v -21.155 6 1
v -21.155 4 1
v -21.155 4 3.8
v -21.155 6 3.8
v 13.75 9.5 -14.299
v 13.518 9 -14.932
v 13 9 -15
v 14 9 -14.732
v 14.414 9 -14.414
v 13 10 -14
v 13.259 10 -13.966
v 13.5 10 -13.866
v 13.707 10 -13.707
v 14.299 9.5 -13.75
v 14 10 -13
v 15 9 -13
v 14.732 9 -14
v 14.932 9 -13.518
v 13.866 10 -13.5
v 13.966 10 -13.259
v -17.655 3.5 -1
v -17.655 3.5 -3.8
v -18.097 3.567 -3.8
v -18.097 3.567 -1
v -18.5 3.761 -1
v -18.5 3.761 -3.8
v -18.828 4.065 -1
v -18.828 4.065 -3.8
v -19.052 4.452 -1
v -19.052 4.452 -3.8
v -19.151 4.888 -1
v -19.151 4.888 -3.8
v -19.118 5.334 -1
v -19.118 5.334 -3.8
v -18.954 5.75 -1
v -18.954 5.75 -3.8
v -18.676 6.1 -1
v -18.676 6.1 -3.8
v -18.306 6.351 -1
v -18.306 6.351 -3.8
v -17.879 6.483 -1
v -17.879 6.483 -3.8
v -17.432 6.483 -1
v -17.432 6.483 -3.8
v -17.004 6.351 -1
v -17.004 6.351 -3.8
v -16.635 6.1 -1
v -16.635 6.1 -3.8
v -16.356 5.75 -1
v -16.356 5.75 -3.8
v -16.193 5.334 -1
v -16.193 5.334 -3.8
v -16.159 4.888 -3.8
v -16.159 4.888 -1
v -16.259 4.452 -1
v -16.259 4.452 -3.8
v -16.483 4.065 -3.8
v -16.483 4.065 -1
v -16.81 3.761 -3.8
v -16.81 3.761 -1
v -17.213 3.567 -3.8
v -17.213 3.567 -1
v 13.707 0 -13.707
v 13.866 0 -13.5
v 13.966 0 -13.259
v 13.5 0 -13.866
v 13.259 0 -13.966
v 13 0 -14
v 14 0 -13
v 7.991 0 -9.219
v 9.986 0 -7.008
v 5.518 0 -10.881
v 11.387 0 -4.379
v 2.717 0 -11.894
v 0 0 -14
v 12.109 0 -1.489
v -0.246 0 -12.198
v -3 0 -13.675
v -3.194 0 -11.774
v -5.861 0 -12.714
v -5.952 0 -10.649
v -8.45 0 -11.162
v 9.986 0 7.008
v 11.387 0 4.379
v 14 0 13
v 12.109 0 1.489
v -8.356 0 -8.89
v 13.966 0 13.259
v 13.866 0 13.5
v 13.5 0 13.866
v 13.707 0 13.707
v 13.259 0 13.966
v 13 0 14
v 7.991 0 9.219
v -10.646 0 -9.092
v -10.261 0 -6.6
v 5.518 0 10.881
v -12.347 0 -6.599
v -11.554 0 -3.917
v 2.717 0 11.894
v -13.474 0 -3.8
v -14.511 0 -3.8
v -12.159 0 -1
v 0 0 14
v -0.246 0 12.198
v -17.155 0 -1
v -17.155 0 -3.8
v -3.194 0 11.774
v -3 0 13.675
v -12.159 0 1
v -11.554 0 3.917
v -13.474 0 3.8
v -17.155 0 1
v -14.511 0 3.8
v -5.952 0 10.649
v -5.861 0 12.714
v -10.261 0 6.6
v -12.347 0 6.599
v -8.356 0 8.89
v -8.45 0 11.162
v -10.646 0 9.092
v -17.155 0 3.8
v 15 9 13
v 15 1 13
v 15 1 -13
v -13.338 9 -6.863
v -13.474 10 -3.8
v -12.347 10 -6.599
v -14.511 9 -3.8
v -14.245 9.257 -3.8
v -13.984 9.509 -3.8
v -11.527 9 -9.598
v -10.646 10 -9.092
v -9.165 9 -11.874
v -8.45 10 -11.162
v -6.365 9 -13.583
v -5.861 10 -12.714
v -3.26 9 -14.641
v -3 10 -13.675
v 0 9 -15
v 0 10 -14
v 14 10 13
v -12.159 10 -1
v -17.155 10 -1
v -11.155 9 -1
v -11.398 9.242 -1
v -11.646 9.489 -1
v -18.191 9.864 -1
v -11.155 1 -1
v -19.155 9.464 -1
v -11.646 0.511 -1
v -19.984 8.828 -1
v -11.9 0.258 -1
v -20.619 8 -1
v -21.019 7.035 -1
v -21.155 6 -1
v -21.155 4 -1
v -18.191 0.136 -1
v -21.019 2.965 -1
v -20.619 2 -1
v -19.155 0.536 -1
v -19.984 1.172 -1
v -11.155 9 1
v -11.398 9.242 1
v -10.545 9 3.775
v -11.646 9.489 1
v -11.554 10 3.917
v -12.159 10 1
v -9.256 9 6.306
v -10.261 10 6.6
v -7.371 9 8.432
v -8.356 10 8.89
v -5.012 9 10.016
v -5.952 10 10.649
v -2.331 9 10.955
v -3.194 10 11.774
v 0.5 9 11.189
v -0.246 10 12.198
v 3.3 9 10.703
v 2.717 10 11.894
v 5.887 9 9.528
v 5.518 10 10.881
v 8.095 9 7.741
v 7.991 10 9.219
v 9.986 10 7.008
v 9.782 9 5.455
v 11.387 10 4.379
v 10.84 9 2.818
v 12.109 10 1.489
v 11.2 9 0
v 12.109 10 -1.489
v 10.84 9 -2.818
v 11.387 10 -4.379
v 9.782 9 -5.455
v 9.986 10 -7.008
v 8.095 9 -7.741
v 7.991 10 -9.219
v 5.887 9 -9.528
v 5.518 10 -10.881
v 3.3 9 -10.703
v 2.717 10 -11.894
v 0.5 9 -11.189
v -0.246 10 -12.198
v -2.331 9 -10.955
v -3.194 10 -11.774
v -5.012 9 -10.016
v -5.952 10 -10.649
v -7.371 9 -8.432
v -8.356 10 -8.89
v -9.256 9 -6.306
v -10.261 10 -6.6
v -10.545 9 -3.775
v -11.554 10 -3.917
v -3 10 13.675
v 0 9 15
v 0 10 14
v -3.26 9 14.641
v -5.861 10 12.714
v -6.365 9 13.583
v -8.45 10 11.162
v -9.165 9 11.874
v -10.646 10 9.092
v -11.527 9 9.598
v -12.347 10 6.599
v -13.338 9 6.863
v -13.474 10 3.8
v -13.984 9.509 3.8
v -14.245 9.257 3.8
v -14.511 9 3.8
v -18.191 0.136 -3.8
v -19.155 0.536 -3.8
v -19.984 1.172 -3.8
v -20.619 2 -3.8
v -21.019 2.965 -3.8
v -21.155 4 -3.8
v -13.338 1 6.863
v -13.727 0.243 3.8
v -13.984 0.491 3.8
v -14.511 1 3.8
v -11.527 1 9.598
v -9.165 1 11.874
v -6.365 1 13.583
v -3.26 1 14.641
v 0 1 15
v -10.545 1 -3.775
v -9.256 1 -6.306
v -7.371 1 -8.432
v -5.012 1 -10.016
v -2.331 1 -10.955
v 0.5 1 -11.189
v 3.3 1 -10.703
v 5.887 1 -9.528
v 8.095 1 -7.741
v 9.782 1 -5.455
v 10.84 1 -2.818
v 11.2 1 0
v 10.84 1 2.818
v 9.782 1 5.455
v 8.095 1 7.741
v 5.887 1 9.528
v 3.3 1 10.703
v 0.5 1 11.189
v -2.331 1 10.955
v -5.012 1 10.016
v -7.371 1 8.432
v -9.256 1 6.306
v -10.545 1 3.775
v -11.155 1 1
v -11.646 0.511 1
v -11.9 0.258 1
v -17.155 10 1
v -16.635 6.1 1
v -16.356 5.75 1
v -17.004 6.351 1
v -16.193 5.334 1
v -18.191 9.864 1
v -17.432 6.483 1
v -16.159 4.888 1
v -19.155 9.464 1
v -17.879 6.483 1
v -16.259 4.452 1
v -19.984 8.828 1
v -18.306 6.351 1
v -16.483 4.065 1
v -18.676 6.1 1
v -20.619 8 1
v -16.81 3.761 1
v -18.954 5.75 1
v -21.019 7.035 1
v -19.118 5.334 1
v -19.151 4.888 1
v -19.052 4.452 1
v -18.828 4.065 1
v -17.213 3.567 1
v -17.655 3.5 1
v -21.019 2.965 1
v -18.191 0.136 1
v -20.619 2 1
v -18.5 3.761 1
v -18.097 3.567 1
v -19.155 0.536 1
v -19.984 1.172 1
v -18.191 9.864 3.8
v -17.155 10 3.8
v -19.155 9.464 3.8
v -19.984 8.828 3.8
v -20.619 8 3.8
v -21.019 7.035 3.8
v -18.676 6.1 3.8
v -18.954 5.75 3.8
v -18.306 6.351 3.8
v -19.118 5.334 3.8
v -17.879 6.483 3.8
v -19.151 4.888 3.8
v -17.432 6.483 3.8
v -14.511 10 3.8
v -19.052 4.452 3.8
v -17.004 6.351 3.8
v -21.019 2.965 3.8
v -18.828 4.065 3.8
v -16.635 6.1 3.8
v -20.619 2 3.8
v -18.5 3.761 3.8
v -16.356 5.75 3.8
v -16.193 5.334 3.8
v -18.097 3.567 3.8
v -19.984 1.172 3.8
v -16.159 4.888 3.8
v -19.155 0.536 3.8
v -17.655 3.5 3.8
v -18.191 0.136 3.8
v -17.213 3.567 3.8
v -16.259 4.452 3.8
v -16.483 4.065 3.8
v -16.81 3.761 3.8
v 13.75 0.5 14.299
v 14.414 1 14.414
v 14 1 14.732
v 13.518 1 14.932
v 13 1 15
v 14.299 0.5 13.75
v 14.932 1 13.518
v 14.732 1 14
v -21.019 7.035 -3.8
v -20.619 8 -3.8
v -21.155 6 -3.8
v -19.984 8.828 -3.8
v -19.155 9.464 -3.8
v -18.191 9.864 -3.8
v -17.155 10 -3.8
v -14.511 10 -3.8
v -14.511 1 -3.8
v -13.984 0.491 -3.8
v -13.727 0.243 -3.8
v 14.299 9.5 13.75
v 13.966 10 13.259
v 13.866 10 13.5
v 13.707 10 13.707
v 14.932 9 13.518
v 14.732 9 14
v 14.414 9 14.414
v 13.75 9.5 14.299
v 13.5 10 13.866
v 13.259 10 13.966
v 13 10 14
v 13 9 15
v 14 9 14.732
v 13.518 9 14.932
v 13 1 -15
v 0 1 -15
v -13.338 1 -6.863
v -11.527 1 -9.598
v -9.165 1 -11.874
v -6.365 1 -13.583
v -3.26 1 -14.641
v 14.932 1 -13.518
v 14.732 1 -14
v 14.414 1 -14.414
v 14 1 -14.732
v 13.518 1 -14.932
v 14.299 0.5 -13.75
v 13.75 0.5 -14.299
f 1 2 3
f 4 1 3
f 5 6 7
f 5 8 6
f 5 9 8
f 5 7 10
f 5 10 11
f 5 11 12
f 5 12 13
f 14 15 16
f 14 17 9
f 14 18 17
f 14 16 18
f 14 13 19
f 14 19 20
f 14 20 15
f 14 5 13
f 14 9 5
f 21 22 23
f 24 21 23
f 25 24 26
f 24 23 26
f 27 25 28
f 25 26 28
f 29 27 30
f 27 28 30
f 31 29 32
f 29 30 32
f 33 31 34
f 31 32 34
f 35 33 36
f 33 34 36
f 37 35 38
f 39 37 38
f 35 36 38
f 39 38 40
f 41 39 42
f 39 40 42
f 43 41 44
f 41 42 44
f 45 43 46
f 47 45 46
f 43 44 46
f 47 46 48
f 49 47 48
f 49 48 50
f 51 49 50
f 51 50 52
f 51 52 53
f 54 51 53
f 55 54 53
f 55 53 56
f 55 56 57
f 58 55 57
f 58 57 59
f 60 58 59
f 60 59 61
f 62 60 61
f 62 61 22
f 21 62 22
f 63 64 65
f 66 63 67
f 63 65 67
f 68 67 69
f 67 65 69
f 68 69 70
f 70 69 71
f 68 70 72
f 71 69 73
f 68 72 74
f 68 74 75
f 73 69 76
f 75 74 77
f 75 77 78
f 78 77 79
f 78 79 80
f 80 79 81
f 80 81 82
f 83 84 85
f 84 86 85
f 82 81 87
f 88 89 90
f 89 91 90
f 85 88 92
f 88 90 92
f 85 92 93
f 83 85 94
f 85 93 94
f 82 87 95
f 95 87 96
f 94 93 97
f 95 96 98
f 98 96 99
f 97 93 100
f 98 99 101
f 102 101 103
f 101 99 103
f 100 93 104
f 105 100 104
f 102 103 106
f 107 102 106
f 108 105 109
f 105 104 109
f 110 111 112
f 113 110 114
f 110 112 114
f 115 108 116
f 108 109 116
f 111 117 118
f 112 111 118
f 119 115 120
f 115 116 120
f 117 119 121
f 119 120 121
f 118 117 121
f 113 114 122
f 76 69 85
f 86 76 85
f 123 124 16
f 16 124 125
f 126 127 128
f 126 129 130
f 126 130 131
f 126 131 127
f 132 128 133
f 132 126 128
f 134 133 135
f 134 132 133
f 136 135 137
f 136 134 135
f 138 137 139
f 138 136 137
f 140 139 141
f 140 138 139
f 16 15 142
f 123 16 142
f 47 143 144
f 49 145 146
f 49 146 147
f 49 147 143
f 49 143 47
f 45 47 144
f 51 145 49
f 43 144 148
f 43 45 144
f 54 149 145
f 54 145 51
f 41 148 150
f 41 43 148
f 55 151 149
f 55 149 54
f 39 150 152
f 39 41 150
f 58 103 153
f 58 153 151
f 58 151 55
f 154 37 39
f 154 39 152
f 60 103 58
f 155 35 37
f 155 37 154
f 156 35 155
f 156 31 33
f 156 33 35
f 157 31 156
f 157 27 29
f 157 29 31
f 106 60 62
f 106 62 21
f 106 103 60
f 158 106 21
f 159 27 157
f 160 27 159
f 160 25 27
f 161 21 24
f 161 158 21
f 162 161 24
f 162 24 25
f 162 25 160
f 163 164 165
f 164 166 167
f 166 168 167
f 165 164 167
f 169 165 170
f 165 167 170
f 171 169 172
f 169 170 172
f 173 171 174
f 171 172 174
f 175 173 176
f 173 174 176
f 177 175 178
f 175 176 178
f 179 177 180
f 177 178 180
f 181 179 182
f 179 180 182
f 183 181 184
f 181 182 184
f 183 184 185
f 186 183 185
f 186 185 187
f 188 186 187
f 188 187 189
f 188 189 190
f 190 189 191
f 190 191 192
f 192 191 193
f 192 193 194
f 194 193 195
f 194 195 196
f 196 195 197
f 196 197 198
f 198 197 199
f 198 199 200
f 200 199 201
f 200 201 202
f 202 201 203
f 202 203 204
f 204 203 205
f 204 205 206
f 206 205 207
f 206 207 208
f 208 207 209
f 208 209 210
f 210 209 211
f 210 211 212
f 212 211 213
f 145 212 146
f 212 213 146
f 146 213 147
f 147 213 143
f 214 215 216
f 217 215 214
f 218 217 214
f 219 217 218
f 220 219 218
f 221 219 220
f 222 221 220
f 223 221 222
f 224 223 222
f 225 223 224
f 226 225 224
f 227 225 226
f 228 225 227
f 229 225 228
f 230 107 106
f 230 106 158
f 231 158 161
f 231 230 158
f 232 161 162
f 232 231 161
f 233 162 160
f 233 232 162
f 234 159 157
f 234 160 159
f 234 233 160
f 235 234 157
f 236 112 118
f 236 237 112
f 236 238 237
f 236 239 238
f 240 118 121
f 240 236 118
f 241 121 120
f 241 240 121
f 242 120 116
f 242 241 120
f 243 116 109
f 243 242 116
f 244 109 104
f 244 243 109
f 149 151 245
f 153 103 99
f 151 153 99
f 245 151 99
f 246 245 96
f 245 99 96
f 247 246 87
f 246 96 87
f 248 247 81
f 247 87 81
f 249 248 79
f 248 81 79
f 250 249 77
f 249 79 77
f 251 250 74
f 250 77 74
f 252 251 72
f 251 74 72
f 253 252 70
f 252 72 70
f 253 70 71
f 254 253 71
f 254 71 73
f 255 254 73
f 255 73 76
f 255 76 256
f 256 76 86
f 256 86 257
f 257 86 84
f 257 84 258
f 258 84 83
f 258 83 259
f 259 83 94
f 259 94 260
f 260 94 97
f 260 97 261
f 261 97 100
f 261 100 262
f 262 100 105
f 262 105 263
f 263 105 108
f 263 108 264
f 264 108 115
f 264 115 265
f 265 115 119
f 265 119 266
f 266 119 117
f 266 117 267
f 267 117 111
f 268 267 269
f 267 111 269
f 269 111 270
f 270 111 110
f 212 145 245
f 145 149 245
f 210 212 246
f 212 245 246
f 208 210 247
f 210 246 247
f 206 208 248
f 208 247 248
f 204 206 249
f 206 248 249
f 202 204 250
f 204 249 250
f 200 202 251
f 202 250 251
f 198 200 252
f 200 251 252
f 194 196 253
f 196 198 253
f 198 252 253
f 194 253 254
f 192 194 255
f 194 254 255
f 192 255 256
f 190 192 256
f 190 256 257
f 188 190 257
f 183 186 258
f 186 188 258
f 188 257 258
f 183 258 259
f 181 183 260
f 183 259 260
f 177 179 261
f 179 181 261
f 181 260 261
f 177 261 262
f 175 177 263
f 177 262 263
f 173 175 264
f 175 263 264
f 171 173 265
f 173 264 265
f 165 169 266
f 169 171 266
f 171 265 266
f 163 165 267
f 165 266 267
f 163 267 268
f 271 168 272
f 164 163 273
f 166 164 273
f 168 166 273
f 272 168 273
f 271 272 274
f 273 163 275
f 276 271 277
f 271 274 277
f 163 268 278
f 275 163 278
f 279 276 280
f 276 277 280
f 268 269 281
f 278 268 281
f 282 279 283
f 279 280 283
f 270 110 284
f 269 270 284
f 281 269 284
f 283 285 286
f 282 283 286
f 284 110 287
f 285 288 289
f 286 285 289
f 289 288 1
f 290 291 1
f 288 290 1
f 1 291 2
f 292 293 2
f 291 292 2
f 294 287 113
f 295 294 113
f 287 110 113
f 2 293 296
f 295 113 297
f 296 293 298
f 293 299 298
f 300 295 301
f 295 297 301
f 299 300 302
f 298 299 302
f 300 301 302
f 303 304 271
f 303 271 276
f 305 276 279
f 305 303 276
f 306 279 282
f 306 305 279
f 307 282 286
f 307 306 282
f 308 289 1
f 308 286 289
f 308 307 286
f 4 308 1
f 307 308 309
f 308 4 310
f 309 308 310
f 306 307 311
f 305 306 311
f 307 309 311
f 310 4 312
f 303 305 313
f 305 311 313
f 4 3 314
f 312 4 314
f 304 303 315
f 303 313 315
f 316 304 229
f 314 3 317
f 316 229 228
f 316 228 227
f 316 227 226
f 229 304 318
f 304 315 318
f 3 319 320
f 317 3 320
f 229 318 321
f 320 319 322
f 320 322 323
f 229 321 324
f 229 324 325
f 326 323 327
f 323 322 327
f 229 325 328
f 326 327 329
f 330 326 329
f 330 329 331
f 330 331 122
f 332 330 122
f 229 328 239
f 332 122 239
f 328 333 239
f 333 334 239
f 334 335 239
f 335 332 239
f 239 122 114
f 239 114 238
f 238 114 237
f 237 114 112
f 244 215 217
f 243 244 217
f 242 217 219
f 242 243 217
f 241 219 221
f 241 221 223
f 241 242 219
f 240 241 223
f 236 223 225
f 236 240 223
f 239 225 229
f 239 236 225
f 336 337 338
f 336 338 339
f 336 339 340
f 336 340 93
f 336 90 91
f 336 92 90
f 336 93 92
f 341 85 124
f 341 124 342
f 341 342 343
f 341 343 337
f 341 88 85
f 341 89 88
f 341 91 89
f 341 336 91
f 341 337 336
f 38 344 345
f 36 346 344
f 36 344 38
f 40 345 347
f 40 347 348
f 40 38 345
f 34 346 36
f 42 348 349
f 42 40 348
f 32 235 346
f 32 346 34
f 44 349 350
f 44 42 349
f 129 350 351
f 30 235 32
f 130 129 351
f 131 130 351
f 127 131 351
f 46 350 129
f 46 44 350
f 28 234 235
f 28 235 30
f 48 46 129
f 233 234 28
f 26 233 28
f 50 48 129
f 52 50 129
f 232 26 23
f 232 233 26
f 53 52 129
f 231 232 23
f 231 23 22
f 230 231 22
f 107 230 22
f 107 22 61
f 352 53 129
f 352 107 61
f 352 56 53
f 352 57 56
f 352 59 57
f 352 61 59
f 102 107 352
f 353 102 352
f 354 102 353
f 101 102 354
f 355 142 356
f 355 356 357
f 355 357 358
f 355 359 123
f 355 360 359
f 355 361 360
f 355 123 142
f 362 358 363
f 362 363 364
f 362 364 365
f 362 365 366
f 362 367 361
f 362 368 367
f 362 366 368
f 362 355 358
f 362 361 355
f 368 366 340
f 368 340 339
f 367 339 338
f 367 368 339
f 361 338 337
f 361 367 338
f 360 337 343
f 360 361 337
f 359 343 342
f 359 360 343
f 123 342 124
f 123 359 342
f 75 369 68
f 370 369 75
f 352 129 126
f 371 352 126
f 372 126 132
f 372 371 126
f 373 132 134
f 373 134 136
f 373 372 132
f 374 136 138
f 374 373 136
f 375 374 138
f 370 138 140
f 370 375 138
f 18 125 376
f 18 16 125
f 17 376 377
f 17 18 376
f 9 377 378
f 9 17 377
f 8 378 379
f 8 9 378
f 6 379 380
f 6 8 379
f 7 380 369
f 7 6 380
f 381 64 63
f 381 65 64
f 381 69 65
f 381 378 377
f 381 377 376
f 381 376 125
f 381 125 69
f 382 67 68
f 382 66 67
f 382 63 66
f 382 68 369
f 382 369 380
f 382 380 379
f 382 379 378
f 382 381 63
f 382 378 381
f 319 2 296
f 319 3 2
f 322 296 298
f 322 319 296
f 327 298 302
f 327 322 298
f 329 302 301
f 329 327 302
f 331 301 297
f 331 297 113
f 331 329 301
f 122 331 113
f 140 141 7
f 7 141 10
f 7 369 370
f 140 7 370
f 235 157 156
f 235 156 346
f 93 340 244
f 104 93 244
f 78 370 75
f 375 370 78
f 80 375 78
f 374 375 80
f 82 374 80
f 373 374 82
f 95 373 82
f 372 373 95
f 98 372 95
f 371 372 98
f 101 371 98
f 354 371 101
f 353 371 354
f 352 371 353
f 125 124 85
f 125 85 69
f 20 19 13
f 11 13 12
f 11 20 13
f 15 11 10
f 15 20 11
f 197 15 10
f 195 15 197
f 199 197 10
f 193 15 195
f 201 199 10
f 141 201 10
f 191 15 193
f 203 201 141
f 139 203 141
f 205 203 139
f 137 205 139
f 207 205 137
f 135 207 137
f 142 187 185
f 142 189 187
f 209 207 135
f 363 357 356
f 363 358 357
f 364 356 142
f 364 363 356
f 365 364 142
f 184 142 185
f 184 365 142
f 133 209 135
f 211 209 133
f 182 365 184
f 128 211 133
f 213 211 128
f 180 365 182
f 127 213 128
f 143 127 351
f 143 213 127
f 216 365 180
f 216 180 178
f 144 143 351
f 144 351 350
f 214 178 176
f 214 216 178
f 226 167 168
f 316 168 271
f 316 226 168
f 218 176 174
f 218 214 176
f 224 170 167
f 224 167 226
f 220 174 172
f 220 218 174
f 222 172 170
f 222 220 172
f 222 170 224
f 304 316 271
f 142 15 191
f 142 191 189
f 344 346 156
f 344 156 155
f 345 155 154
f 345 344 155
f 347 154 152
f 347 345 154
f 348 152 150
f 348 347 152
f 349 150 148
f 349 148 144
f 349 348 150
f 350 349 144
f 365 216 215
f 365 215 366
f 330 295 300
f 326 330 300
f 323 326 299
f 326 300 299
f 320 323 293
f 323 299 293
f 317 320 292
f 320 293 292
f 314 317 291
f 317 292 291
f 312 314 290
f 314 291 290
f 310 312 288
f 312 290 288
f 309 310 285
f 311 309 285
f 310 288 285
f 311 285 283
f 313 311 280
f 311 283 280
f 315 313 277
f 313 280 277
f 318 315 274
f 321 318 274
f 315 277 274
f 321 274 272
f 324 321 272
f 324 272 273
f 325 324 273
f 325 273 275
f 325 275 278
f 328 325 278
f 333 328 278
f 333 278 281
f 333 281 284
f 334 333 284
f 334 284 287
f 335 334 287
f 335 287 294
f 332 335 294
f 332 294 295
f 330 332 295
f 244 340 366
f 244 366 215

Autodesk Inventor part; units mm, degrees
ref_plane "YZ Plane" through (0, 0, 0) normal (1, 0, 0) x (0, 1, 0)
ref_plane "XZ Plane" through (0, 0, 0) normal (0, 1, 0) x (-1, 0, 0)
ref_plane "XY Plane" through (0, 0, 0) normal (0, 0, 1) x (1, 0, 0)
sketch "Эскиз1" plane through (0, 0, 0) normal (0, 1, 0) x (-1, 0, 0)
  arc A0 (11.1553, 1) -> (11.1553, -1) centre (0, 0) ccw
  line L0 (-15, 15) -> (-15, -15)
  line L1 (-15, 15) -> (0, 15)
  line L2 (-15, -15) -> (0, -15)
  line L3 (11.1553, 1) -> (14.9666, 1)
  line L4 (14.9666, -1) -> (11.1553, -1)
  arc A1 (0, -15) -> (14.5107, -3.8) centre (0, 0) ccw
  arc A2 (14.5107, 3.8) -> (0, 15) centre (0, 0) ccw
  line L5 (11.1553, -1) -> (21.1553, -1)
  line L6 (21.1553, -1) -> (21.1553, -3.8)
  line L7 (21.1553, -3.8) -> (14.5107, -3.8)
  line L8 (11.1553, 1) -> (21.1553, 1)
  line L9 (21.1553, 1) -> (21.1553, 3.8)
  line L10 (21.1553, 3.8) -> (14.5107, 3.8)
  point P0 (15, 0)
  dimension "d0" = 22.4
  dimension "d2" = 30
  dimension "d5" = 2.8
  dimension "d6" = 2.8
extrude "Выдавливание1" add sketch "Эскиз1" along normal blind 10
fillet "Сопряжение1" radius 4 4 edges at (-21.1553, 10, 2.4) (-21.1553, 10, -2.4) (-21.1553, 0, 2.4) (-21.1553, 0, -2.4)
sketch "Эскиз3" plane through (-14.5107, 0, 3.8) normal (0, 0, 1) x (1, 0, 0)
  arc A0 (-6.6446, 4) -> (-2.6446, 0) centre (-2.6446, 4) ccw projected
  line L0 (-2.6446, 0) -> (0, 0) projected
  line L1 (0, 0) -> (0, 10) projected
  line L2 (-2.6446, 10) -> (0, 10) projected
  arc A1 (-2.6446, 10) -> (-6.6446, 6) centre (-2.6446, 6) ccw projected
  line L3 (-6.6446, 4) -> (-6.6446, 6) projected
  line L4 (-6.6446, 5) -> (-3.1446, 5) construction
  point P0 (14.5107, 0)
  dimension "d20" = 3.5
hole "Отверстие2" at (-17.6553, 5, 3.8) direction (0, 0, -1) diameter 3 depth 8 tip angle 118
fillet "Сопряжение2" radius 2 2 edges at (15, 5, 15) (15, 5, -15)
chamfer "Фаска1" distance 1 angle 45 16 edges at (11.2, 10, 0) (11.2, 0, 0) (6.5, 10, 15) (14.4142, 10, 14.4142) (15, 10, 0) (14.4142, 10, -14.4142) (6.5, 10, -15) (-9.1652, 10, -11.8743) (-9.1652, 10, 11.8743) (6.5, 0, 15) (14.4142, 0, 14.4142) (15, 0, 0) (14.4142, 0, -14.4142) (6.5, 0, -15) (-9.1652, 0, -11.8743) (-9.1652, 0, 11.8743)
properties part number "BasicMount 22mm"
